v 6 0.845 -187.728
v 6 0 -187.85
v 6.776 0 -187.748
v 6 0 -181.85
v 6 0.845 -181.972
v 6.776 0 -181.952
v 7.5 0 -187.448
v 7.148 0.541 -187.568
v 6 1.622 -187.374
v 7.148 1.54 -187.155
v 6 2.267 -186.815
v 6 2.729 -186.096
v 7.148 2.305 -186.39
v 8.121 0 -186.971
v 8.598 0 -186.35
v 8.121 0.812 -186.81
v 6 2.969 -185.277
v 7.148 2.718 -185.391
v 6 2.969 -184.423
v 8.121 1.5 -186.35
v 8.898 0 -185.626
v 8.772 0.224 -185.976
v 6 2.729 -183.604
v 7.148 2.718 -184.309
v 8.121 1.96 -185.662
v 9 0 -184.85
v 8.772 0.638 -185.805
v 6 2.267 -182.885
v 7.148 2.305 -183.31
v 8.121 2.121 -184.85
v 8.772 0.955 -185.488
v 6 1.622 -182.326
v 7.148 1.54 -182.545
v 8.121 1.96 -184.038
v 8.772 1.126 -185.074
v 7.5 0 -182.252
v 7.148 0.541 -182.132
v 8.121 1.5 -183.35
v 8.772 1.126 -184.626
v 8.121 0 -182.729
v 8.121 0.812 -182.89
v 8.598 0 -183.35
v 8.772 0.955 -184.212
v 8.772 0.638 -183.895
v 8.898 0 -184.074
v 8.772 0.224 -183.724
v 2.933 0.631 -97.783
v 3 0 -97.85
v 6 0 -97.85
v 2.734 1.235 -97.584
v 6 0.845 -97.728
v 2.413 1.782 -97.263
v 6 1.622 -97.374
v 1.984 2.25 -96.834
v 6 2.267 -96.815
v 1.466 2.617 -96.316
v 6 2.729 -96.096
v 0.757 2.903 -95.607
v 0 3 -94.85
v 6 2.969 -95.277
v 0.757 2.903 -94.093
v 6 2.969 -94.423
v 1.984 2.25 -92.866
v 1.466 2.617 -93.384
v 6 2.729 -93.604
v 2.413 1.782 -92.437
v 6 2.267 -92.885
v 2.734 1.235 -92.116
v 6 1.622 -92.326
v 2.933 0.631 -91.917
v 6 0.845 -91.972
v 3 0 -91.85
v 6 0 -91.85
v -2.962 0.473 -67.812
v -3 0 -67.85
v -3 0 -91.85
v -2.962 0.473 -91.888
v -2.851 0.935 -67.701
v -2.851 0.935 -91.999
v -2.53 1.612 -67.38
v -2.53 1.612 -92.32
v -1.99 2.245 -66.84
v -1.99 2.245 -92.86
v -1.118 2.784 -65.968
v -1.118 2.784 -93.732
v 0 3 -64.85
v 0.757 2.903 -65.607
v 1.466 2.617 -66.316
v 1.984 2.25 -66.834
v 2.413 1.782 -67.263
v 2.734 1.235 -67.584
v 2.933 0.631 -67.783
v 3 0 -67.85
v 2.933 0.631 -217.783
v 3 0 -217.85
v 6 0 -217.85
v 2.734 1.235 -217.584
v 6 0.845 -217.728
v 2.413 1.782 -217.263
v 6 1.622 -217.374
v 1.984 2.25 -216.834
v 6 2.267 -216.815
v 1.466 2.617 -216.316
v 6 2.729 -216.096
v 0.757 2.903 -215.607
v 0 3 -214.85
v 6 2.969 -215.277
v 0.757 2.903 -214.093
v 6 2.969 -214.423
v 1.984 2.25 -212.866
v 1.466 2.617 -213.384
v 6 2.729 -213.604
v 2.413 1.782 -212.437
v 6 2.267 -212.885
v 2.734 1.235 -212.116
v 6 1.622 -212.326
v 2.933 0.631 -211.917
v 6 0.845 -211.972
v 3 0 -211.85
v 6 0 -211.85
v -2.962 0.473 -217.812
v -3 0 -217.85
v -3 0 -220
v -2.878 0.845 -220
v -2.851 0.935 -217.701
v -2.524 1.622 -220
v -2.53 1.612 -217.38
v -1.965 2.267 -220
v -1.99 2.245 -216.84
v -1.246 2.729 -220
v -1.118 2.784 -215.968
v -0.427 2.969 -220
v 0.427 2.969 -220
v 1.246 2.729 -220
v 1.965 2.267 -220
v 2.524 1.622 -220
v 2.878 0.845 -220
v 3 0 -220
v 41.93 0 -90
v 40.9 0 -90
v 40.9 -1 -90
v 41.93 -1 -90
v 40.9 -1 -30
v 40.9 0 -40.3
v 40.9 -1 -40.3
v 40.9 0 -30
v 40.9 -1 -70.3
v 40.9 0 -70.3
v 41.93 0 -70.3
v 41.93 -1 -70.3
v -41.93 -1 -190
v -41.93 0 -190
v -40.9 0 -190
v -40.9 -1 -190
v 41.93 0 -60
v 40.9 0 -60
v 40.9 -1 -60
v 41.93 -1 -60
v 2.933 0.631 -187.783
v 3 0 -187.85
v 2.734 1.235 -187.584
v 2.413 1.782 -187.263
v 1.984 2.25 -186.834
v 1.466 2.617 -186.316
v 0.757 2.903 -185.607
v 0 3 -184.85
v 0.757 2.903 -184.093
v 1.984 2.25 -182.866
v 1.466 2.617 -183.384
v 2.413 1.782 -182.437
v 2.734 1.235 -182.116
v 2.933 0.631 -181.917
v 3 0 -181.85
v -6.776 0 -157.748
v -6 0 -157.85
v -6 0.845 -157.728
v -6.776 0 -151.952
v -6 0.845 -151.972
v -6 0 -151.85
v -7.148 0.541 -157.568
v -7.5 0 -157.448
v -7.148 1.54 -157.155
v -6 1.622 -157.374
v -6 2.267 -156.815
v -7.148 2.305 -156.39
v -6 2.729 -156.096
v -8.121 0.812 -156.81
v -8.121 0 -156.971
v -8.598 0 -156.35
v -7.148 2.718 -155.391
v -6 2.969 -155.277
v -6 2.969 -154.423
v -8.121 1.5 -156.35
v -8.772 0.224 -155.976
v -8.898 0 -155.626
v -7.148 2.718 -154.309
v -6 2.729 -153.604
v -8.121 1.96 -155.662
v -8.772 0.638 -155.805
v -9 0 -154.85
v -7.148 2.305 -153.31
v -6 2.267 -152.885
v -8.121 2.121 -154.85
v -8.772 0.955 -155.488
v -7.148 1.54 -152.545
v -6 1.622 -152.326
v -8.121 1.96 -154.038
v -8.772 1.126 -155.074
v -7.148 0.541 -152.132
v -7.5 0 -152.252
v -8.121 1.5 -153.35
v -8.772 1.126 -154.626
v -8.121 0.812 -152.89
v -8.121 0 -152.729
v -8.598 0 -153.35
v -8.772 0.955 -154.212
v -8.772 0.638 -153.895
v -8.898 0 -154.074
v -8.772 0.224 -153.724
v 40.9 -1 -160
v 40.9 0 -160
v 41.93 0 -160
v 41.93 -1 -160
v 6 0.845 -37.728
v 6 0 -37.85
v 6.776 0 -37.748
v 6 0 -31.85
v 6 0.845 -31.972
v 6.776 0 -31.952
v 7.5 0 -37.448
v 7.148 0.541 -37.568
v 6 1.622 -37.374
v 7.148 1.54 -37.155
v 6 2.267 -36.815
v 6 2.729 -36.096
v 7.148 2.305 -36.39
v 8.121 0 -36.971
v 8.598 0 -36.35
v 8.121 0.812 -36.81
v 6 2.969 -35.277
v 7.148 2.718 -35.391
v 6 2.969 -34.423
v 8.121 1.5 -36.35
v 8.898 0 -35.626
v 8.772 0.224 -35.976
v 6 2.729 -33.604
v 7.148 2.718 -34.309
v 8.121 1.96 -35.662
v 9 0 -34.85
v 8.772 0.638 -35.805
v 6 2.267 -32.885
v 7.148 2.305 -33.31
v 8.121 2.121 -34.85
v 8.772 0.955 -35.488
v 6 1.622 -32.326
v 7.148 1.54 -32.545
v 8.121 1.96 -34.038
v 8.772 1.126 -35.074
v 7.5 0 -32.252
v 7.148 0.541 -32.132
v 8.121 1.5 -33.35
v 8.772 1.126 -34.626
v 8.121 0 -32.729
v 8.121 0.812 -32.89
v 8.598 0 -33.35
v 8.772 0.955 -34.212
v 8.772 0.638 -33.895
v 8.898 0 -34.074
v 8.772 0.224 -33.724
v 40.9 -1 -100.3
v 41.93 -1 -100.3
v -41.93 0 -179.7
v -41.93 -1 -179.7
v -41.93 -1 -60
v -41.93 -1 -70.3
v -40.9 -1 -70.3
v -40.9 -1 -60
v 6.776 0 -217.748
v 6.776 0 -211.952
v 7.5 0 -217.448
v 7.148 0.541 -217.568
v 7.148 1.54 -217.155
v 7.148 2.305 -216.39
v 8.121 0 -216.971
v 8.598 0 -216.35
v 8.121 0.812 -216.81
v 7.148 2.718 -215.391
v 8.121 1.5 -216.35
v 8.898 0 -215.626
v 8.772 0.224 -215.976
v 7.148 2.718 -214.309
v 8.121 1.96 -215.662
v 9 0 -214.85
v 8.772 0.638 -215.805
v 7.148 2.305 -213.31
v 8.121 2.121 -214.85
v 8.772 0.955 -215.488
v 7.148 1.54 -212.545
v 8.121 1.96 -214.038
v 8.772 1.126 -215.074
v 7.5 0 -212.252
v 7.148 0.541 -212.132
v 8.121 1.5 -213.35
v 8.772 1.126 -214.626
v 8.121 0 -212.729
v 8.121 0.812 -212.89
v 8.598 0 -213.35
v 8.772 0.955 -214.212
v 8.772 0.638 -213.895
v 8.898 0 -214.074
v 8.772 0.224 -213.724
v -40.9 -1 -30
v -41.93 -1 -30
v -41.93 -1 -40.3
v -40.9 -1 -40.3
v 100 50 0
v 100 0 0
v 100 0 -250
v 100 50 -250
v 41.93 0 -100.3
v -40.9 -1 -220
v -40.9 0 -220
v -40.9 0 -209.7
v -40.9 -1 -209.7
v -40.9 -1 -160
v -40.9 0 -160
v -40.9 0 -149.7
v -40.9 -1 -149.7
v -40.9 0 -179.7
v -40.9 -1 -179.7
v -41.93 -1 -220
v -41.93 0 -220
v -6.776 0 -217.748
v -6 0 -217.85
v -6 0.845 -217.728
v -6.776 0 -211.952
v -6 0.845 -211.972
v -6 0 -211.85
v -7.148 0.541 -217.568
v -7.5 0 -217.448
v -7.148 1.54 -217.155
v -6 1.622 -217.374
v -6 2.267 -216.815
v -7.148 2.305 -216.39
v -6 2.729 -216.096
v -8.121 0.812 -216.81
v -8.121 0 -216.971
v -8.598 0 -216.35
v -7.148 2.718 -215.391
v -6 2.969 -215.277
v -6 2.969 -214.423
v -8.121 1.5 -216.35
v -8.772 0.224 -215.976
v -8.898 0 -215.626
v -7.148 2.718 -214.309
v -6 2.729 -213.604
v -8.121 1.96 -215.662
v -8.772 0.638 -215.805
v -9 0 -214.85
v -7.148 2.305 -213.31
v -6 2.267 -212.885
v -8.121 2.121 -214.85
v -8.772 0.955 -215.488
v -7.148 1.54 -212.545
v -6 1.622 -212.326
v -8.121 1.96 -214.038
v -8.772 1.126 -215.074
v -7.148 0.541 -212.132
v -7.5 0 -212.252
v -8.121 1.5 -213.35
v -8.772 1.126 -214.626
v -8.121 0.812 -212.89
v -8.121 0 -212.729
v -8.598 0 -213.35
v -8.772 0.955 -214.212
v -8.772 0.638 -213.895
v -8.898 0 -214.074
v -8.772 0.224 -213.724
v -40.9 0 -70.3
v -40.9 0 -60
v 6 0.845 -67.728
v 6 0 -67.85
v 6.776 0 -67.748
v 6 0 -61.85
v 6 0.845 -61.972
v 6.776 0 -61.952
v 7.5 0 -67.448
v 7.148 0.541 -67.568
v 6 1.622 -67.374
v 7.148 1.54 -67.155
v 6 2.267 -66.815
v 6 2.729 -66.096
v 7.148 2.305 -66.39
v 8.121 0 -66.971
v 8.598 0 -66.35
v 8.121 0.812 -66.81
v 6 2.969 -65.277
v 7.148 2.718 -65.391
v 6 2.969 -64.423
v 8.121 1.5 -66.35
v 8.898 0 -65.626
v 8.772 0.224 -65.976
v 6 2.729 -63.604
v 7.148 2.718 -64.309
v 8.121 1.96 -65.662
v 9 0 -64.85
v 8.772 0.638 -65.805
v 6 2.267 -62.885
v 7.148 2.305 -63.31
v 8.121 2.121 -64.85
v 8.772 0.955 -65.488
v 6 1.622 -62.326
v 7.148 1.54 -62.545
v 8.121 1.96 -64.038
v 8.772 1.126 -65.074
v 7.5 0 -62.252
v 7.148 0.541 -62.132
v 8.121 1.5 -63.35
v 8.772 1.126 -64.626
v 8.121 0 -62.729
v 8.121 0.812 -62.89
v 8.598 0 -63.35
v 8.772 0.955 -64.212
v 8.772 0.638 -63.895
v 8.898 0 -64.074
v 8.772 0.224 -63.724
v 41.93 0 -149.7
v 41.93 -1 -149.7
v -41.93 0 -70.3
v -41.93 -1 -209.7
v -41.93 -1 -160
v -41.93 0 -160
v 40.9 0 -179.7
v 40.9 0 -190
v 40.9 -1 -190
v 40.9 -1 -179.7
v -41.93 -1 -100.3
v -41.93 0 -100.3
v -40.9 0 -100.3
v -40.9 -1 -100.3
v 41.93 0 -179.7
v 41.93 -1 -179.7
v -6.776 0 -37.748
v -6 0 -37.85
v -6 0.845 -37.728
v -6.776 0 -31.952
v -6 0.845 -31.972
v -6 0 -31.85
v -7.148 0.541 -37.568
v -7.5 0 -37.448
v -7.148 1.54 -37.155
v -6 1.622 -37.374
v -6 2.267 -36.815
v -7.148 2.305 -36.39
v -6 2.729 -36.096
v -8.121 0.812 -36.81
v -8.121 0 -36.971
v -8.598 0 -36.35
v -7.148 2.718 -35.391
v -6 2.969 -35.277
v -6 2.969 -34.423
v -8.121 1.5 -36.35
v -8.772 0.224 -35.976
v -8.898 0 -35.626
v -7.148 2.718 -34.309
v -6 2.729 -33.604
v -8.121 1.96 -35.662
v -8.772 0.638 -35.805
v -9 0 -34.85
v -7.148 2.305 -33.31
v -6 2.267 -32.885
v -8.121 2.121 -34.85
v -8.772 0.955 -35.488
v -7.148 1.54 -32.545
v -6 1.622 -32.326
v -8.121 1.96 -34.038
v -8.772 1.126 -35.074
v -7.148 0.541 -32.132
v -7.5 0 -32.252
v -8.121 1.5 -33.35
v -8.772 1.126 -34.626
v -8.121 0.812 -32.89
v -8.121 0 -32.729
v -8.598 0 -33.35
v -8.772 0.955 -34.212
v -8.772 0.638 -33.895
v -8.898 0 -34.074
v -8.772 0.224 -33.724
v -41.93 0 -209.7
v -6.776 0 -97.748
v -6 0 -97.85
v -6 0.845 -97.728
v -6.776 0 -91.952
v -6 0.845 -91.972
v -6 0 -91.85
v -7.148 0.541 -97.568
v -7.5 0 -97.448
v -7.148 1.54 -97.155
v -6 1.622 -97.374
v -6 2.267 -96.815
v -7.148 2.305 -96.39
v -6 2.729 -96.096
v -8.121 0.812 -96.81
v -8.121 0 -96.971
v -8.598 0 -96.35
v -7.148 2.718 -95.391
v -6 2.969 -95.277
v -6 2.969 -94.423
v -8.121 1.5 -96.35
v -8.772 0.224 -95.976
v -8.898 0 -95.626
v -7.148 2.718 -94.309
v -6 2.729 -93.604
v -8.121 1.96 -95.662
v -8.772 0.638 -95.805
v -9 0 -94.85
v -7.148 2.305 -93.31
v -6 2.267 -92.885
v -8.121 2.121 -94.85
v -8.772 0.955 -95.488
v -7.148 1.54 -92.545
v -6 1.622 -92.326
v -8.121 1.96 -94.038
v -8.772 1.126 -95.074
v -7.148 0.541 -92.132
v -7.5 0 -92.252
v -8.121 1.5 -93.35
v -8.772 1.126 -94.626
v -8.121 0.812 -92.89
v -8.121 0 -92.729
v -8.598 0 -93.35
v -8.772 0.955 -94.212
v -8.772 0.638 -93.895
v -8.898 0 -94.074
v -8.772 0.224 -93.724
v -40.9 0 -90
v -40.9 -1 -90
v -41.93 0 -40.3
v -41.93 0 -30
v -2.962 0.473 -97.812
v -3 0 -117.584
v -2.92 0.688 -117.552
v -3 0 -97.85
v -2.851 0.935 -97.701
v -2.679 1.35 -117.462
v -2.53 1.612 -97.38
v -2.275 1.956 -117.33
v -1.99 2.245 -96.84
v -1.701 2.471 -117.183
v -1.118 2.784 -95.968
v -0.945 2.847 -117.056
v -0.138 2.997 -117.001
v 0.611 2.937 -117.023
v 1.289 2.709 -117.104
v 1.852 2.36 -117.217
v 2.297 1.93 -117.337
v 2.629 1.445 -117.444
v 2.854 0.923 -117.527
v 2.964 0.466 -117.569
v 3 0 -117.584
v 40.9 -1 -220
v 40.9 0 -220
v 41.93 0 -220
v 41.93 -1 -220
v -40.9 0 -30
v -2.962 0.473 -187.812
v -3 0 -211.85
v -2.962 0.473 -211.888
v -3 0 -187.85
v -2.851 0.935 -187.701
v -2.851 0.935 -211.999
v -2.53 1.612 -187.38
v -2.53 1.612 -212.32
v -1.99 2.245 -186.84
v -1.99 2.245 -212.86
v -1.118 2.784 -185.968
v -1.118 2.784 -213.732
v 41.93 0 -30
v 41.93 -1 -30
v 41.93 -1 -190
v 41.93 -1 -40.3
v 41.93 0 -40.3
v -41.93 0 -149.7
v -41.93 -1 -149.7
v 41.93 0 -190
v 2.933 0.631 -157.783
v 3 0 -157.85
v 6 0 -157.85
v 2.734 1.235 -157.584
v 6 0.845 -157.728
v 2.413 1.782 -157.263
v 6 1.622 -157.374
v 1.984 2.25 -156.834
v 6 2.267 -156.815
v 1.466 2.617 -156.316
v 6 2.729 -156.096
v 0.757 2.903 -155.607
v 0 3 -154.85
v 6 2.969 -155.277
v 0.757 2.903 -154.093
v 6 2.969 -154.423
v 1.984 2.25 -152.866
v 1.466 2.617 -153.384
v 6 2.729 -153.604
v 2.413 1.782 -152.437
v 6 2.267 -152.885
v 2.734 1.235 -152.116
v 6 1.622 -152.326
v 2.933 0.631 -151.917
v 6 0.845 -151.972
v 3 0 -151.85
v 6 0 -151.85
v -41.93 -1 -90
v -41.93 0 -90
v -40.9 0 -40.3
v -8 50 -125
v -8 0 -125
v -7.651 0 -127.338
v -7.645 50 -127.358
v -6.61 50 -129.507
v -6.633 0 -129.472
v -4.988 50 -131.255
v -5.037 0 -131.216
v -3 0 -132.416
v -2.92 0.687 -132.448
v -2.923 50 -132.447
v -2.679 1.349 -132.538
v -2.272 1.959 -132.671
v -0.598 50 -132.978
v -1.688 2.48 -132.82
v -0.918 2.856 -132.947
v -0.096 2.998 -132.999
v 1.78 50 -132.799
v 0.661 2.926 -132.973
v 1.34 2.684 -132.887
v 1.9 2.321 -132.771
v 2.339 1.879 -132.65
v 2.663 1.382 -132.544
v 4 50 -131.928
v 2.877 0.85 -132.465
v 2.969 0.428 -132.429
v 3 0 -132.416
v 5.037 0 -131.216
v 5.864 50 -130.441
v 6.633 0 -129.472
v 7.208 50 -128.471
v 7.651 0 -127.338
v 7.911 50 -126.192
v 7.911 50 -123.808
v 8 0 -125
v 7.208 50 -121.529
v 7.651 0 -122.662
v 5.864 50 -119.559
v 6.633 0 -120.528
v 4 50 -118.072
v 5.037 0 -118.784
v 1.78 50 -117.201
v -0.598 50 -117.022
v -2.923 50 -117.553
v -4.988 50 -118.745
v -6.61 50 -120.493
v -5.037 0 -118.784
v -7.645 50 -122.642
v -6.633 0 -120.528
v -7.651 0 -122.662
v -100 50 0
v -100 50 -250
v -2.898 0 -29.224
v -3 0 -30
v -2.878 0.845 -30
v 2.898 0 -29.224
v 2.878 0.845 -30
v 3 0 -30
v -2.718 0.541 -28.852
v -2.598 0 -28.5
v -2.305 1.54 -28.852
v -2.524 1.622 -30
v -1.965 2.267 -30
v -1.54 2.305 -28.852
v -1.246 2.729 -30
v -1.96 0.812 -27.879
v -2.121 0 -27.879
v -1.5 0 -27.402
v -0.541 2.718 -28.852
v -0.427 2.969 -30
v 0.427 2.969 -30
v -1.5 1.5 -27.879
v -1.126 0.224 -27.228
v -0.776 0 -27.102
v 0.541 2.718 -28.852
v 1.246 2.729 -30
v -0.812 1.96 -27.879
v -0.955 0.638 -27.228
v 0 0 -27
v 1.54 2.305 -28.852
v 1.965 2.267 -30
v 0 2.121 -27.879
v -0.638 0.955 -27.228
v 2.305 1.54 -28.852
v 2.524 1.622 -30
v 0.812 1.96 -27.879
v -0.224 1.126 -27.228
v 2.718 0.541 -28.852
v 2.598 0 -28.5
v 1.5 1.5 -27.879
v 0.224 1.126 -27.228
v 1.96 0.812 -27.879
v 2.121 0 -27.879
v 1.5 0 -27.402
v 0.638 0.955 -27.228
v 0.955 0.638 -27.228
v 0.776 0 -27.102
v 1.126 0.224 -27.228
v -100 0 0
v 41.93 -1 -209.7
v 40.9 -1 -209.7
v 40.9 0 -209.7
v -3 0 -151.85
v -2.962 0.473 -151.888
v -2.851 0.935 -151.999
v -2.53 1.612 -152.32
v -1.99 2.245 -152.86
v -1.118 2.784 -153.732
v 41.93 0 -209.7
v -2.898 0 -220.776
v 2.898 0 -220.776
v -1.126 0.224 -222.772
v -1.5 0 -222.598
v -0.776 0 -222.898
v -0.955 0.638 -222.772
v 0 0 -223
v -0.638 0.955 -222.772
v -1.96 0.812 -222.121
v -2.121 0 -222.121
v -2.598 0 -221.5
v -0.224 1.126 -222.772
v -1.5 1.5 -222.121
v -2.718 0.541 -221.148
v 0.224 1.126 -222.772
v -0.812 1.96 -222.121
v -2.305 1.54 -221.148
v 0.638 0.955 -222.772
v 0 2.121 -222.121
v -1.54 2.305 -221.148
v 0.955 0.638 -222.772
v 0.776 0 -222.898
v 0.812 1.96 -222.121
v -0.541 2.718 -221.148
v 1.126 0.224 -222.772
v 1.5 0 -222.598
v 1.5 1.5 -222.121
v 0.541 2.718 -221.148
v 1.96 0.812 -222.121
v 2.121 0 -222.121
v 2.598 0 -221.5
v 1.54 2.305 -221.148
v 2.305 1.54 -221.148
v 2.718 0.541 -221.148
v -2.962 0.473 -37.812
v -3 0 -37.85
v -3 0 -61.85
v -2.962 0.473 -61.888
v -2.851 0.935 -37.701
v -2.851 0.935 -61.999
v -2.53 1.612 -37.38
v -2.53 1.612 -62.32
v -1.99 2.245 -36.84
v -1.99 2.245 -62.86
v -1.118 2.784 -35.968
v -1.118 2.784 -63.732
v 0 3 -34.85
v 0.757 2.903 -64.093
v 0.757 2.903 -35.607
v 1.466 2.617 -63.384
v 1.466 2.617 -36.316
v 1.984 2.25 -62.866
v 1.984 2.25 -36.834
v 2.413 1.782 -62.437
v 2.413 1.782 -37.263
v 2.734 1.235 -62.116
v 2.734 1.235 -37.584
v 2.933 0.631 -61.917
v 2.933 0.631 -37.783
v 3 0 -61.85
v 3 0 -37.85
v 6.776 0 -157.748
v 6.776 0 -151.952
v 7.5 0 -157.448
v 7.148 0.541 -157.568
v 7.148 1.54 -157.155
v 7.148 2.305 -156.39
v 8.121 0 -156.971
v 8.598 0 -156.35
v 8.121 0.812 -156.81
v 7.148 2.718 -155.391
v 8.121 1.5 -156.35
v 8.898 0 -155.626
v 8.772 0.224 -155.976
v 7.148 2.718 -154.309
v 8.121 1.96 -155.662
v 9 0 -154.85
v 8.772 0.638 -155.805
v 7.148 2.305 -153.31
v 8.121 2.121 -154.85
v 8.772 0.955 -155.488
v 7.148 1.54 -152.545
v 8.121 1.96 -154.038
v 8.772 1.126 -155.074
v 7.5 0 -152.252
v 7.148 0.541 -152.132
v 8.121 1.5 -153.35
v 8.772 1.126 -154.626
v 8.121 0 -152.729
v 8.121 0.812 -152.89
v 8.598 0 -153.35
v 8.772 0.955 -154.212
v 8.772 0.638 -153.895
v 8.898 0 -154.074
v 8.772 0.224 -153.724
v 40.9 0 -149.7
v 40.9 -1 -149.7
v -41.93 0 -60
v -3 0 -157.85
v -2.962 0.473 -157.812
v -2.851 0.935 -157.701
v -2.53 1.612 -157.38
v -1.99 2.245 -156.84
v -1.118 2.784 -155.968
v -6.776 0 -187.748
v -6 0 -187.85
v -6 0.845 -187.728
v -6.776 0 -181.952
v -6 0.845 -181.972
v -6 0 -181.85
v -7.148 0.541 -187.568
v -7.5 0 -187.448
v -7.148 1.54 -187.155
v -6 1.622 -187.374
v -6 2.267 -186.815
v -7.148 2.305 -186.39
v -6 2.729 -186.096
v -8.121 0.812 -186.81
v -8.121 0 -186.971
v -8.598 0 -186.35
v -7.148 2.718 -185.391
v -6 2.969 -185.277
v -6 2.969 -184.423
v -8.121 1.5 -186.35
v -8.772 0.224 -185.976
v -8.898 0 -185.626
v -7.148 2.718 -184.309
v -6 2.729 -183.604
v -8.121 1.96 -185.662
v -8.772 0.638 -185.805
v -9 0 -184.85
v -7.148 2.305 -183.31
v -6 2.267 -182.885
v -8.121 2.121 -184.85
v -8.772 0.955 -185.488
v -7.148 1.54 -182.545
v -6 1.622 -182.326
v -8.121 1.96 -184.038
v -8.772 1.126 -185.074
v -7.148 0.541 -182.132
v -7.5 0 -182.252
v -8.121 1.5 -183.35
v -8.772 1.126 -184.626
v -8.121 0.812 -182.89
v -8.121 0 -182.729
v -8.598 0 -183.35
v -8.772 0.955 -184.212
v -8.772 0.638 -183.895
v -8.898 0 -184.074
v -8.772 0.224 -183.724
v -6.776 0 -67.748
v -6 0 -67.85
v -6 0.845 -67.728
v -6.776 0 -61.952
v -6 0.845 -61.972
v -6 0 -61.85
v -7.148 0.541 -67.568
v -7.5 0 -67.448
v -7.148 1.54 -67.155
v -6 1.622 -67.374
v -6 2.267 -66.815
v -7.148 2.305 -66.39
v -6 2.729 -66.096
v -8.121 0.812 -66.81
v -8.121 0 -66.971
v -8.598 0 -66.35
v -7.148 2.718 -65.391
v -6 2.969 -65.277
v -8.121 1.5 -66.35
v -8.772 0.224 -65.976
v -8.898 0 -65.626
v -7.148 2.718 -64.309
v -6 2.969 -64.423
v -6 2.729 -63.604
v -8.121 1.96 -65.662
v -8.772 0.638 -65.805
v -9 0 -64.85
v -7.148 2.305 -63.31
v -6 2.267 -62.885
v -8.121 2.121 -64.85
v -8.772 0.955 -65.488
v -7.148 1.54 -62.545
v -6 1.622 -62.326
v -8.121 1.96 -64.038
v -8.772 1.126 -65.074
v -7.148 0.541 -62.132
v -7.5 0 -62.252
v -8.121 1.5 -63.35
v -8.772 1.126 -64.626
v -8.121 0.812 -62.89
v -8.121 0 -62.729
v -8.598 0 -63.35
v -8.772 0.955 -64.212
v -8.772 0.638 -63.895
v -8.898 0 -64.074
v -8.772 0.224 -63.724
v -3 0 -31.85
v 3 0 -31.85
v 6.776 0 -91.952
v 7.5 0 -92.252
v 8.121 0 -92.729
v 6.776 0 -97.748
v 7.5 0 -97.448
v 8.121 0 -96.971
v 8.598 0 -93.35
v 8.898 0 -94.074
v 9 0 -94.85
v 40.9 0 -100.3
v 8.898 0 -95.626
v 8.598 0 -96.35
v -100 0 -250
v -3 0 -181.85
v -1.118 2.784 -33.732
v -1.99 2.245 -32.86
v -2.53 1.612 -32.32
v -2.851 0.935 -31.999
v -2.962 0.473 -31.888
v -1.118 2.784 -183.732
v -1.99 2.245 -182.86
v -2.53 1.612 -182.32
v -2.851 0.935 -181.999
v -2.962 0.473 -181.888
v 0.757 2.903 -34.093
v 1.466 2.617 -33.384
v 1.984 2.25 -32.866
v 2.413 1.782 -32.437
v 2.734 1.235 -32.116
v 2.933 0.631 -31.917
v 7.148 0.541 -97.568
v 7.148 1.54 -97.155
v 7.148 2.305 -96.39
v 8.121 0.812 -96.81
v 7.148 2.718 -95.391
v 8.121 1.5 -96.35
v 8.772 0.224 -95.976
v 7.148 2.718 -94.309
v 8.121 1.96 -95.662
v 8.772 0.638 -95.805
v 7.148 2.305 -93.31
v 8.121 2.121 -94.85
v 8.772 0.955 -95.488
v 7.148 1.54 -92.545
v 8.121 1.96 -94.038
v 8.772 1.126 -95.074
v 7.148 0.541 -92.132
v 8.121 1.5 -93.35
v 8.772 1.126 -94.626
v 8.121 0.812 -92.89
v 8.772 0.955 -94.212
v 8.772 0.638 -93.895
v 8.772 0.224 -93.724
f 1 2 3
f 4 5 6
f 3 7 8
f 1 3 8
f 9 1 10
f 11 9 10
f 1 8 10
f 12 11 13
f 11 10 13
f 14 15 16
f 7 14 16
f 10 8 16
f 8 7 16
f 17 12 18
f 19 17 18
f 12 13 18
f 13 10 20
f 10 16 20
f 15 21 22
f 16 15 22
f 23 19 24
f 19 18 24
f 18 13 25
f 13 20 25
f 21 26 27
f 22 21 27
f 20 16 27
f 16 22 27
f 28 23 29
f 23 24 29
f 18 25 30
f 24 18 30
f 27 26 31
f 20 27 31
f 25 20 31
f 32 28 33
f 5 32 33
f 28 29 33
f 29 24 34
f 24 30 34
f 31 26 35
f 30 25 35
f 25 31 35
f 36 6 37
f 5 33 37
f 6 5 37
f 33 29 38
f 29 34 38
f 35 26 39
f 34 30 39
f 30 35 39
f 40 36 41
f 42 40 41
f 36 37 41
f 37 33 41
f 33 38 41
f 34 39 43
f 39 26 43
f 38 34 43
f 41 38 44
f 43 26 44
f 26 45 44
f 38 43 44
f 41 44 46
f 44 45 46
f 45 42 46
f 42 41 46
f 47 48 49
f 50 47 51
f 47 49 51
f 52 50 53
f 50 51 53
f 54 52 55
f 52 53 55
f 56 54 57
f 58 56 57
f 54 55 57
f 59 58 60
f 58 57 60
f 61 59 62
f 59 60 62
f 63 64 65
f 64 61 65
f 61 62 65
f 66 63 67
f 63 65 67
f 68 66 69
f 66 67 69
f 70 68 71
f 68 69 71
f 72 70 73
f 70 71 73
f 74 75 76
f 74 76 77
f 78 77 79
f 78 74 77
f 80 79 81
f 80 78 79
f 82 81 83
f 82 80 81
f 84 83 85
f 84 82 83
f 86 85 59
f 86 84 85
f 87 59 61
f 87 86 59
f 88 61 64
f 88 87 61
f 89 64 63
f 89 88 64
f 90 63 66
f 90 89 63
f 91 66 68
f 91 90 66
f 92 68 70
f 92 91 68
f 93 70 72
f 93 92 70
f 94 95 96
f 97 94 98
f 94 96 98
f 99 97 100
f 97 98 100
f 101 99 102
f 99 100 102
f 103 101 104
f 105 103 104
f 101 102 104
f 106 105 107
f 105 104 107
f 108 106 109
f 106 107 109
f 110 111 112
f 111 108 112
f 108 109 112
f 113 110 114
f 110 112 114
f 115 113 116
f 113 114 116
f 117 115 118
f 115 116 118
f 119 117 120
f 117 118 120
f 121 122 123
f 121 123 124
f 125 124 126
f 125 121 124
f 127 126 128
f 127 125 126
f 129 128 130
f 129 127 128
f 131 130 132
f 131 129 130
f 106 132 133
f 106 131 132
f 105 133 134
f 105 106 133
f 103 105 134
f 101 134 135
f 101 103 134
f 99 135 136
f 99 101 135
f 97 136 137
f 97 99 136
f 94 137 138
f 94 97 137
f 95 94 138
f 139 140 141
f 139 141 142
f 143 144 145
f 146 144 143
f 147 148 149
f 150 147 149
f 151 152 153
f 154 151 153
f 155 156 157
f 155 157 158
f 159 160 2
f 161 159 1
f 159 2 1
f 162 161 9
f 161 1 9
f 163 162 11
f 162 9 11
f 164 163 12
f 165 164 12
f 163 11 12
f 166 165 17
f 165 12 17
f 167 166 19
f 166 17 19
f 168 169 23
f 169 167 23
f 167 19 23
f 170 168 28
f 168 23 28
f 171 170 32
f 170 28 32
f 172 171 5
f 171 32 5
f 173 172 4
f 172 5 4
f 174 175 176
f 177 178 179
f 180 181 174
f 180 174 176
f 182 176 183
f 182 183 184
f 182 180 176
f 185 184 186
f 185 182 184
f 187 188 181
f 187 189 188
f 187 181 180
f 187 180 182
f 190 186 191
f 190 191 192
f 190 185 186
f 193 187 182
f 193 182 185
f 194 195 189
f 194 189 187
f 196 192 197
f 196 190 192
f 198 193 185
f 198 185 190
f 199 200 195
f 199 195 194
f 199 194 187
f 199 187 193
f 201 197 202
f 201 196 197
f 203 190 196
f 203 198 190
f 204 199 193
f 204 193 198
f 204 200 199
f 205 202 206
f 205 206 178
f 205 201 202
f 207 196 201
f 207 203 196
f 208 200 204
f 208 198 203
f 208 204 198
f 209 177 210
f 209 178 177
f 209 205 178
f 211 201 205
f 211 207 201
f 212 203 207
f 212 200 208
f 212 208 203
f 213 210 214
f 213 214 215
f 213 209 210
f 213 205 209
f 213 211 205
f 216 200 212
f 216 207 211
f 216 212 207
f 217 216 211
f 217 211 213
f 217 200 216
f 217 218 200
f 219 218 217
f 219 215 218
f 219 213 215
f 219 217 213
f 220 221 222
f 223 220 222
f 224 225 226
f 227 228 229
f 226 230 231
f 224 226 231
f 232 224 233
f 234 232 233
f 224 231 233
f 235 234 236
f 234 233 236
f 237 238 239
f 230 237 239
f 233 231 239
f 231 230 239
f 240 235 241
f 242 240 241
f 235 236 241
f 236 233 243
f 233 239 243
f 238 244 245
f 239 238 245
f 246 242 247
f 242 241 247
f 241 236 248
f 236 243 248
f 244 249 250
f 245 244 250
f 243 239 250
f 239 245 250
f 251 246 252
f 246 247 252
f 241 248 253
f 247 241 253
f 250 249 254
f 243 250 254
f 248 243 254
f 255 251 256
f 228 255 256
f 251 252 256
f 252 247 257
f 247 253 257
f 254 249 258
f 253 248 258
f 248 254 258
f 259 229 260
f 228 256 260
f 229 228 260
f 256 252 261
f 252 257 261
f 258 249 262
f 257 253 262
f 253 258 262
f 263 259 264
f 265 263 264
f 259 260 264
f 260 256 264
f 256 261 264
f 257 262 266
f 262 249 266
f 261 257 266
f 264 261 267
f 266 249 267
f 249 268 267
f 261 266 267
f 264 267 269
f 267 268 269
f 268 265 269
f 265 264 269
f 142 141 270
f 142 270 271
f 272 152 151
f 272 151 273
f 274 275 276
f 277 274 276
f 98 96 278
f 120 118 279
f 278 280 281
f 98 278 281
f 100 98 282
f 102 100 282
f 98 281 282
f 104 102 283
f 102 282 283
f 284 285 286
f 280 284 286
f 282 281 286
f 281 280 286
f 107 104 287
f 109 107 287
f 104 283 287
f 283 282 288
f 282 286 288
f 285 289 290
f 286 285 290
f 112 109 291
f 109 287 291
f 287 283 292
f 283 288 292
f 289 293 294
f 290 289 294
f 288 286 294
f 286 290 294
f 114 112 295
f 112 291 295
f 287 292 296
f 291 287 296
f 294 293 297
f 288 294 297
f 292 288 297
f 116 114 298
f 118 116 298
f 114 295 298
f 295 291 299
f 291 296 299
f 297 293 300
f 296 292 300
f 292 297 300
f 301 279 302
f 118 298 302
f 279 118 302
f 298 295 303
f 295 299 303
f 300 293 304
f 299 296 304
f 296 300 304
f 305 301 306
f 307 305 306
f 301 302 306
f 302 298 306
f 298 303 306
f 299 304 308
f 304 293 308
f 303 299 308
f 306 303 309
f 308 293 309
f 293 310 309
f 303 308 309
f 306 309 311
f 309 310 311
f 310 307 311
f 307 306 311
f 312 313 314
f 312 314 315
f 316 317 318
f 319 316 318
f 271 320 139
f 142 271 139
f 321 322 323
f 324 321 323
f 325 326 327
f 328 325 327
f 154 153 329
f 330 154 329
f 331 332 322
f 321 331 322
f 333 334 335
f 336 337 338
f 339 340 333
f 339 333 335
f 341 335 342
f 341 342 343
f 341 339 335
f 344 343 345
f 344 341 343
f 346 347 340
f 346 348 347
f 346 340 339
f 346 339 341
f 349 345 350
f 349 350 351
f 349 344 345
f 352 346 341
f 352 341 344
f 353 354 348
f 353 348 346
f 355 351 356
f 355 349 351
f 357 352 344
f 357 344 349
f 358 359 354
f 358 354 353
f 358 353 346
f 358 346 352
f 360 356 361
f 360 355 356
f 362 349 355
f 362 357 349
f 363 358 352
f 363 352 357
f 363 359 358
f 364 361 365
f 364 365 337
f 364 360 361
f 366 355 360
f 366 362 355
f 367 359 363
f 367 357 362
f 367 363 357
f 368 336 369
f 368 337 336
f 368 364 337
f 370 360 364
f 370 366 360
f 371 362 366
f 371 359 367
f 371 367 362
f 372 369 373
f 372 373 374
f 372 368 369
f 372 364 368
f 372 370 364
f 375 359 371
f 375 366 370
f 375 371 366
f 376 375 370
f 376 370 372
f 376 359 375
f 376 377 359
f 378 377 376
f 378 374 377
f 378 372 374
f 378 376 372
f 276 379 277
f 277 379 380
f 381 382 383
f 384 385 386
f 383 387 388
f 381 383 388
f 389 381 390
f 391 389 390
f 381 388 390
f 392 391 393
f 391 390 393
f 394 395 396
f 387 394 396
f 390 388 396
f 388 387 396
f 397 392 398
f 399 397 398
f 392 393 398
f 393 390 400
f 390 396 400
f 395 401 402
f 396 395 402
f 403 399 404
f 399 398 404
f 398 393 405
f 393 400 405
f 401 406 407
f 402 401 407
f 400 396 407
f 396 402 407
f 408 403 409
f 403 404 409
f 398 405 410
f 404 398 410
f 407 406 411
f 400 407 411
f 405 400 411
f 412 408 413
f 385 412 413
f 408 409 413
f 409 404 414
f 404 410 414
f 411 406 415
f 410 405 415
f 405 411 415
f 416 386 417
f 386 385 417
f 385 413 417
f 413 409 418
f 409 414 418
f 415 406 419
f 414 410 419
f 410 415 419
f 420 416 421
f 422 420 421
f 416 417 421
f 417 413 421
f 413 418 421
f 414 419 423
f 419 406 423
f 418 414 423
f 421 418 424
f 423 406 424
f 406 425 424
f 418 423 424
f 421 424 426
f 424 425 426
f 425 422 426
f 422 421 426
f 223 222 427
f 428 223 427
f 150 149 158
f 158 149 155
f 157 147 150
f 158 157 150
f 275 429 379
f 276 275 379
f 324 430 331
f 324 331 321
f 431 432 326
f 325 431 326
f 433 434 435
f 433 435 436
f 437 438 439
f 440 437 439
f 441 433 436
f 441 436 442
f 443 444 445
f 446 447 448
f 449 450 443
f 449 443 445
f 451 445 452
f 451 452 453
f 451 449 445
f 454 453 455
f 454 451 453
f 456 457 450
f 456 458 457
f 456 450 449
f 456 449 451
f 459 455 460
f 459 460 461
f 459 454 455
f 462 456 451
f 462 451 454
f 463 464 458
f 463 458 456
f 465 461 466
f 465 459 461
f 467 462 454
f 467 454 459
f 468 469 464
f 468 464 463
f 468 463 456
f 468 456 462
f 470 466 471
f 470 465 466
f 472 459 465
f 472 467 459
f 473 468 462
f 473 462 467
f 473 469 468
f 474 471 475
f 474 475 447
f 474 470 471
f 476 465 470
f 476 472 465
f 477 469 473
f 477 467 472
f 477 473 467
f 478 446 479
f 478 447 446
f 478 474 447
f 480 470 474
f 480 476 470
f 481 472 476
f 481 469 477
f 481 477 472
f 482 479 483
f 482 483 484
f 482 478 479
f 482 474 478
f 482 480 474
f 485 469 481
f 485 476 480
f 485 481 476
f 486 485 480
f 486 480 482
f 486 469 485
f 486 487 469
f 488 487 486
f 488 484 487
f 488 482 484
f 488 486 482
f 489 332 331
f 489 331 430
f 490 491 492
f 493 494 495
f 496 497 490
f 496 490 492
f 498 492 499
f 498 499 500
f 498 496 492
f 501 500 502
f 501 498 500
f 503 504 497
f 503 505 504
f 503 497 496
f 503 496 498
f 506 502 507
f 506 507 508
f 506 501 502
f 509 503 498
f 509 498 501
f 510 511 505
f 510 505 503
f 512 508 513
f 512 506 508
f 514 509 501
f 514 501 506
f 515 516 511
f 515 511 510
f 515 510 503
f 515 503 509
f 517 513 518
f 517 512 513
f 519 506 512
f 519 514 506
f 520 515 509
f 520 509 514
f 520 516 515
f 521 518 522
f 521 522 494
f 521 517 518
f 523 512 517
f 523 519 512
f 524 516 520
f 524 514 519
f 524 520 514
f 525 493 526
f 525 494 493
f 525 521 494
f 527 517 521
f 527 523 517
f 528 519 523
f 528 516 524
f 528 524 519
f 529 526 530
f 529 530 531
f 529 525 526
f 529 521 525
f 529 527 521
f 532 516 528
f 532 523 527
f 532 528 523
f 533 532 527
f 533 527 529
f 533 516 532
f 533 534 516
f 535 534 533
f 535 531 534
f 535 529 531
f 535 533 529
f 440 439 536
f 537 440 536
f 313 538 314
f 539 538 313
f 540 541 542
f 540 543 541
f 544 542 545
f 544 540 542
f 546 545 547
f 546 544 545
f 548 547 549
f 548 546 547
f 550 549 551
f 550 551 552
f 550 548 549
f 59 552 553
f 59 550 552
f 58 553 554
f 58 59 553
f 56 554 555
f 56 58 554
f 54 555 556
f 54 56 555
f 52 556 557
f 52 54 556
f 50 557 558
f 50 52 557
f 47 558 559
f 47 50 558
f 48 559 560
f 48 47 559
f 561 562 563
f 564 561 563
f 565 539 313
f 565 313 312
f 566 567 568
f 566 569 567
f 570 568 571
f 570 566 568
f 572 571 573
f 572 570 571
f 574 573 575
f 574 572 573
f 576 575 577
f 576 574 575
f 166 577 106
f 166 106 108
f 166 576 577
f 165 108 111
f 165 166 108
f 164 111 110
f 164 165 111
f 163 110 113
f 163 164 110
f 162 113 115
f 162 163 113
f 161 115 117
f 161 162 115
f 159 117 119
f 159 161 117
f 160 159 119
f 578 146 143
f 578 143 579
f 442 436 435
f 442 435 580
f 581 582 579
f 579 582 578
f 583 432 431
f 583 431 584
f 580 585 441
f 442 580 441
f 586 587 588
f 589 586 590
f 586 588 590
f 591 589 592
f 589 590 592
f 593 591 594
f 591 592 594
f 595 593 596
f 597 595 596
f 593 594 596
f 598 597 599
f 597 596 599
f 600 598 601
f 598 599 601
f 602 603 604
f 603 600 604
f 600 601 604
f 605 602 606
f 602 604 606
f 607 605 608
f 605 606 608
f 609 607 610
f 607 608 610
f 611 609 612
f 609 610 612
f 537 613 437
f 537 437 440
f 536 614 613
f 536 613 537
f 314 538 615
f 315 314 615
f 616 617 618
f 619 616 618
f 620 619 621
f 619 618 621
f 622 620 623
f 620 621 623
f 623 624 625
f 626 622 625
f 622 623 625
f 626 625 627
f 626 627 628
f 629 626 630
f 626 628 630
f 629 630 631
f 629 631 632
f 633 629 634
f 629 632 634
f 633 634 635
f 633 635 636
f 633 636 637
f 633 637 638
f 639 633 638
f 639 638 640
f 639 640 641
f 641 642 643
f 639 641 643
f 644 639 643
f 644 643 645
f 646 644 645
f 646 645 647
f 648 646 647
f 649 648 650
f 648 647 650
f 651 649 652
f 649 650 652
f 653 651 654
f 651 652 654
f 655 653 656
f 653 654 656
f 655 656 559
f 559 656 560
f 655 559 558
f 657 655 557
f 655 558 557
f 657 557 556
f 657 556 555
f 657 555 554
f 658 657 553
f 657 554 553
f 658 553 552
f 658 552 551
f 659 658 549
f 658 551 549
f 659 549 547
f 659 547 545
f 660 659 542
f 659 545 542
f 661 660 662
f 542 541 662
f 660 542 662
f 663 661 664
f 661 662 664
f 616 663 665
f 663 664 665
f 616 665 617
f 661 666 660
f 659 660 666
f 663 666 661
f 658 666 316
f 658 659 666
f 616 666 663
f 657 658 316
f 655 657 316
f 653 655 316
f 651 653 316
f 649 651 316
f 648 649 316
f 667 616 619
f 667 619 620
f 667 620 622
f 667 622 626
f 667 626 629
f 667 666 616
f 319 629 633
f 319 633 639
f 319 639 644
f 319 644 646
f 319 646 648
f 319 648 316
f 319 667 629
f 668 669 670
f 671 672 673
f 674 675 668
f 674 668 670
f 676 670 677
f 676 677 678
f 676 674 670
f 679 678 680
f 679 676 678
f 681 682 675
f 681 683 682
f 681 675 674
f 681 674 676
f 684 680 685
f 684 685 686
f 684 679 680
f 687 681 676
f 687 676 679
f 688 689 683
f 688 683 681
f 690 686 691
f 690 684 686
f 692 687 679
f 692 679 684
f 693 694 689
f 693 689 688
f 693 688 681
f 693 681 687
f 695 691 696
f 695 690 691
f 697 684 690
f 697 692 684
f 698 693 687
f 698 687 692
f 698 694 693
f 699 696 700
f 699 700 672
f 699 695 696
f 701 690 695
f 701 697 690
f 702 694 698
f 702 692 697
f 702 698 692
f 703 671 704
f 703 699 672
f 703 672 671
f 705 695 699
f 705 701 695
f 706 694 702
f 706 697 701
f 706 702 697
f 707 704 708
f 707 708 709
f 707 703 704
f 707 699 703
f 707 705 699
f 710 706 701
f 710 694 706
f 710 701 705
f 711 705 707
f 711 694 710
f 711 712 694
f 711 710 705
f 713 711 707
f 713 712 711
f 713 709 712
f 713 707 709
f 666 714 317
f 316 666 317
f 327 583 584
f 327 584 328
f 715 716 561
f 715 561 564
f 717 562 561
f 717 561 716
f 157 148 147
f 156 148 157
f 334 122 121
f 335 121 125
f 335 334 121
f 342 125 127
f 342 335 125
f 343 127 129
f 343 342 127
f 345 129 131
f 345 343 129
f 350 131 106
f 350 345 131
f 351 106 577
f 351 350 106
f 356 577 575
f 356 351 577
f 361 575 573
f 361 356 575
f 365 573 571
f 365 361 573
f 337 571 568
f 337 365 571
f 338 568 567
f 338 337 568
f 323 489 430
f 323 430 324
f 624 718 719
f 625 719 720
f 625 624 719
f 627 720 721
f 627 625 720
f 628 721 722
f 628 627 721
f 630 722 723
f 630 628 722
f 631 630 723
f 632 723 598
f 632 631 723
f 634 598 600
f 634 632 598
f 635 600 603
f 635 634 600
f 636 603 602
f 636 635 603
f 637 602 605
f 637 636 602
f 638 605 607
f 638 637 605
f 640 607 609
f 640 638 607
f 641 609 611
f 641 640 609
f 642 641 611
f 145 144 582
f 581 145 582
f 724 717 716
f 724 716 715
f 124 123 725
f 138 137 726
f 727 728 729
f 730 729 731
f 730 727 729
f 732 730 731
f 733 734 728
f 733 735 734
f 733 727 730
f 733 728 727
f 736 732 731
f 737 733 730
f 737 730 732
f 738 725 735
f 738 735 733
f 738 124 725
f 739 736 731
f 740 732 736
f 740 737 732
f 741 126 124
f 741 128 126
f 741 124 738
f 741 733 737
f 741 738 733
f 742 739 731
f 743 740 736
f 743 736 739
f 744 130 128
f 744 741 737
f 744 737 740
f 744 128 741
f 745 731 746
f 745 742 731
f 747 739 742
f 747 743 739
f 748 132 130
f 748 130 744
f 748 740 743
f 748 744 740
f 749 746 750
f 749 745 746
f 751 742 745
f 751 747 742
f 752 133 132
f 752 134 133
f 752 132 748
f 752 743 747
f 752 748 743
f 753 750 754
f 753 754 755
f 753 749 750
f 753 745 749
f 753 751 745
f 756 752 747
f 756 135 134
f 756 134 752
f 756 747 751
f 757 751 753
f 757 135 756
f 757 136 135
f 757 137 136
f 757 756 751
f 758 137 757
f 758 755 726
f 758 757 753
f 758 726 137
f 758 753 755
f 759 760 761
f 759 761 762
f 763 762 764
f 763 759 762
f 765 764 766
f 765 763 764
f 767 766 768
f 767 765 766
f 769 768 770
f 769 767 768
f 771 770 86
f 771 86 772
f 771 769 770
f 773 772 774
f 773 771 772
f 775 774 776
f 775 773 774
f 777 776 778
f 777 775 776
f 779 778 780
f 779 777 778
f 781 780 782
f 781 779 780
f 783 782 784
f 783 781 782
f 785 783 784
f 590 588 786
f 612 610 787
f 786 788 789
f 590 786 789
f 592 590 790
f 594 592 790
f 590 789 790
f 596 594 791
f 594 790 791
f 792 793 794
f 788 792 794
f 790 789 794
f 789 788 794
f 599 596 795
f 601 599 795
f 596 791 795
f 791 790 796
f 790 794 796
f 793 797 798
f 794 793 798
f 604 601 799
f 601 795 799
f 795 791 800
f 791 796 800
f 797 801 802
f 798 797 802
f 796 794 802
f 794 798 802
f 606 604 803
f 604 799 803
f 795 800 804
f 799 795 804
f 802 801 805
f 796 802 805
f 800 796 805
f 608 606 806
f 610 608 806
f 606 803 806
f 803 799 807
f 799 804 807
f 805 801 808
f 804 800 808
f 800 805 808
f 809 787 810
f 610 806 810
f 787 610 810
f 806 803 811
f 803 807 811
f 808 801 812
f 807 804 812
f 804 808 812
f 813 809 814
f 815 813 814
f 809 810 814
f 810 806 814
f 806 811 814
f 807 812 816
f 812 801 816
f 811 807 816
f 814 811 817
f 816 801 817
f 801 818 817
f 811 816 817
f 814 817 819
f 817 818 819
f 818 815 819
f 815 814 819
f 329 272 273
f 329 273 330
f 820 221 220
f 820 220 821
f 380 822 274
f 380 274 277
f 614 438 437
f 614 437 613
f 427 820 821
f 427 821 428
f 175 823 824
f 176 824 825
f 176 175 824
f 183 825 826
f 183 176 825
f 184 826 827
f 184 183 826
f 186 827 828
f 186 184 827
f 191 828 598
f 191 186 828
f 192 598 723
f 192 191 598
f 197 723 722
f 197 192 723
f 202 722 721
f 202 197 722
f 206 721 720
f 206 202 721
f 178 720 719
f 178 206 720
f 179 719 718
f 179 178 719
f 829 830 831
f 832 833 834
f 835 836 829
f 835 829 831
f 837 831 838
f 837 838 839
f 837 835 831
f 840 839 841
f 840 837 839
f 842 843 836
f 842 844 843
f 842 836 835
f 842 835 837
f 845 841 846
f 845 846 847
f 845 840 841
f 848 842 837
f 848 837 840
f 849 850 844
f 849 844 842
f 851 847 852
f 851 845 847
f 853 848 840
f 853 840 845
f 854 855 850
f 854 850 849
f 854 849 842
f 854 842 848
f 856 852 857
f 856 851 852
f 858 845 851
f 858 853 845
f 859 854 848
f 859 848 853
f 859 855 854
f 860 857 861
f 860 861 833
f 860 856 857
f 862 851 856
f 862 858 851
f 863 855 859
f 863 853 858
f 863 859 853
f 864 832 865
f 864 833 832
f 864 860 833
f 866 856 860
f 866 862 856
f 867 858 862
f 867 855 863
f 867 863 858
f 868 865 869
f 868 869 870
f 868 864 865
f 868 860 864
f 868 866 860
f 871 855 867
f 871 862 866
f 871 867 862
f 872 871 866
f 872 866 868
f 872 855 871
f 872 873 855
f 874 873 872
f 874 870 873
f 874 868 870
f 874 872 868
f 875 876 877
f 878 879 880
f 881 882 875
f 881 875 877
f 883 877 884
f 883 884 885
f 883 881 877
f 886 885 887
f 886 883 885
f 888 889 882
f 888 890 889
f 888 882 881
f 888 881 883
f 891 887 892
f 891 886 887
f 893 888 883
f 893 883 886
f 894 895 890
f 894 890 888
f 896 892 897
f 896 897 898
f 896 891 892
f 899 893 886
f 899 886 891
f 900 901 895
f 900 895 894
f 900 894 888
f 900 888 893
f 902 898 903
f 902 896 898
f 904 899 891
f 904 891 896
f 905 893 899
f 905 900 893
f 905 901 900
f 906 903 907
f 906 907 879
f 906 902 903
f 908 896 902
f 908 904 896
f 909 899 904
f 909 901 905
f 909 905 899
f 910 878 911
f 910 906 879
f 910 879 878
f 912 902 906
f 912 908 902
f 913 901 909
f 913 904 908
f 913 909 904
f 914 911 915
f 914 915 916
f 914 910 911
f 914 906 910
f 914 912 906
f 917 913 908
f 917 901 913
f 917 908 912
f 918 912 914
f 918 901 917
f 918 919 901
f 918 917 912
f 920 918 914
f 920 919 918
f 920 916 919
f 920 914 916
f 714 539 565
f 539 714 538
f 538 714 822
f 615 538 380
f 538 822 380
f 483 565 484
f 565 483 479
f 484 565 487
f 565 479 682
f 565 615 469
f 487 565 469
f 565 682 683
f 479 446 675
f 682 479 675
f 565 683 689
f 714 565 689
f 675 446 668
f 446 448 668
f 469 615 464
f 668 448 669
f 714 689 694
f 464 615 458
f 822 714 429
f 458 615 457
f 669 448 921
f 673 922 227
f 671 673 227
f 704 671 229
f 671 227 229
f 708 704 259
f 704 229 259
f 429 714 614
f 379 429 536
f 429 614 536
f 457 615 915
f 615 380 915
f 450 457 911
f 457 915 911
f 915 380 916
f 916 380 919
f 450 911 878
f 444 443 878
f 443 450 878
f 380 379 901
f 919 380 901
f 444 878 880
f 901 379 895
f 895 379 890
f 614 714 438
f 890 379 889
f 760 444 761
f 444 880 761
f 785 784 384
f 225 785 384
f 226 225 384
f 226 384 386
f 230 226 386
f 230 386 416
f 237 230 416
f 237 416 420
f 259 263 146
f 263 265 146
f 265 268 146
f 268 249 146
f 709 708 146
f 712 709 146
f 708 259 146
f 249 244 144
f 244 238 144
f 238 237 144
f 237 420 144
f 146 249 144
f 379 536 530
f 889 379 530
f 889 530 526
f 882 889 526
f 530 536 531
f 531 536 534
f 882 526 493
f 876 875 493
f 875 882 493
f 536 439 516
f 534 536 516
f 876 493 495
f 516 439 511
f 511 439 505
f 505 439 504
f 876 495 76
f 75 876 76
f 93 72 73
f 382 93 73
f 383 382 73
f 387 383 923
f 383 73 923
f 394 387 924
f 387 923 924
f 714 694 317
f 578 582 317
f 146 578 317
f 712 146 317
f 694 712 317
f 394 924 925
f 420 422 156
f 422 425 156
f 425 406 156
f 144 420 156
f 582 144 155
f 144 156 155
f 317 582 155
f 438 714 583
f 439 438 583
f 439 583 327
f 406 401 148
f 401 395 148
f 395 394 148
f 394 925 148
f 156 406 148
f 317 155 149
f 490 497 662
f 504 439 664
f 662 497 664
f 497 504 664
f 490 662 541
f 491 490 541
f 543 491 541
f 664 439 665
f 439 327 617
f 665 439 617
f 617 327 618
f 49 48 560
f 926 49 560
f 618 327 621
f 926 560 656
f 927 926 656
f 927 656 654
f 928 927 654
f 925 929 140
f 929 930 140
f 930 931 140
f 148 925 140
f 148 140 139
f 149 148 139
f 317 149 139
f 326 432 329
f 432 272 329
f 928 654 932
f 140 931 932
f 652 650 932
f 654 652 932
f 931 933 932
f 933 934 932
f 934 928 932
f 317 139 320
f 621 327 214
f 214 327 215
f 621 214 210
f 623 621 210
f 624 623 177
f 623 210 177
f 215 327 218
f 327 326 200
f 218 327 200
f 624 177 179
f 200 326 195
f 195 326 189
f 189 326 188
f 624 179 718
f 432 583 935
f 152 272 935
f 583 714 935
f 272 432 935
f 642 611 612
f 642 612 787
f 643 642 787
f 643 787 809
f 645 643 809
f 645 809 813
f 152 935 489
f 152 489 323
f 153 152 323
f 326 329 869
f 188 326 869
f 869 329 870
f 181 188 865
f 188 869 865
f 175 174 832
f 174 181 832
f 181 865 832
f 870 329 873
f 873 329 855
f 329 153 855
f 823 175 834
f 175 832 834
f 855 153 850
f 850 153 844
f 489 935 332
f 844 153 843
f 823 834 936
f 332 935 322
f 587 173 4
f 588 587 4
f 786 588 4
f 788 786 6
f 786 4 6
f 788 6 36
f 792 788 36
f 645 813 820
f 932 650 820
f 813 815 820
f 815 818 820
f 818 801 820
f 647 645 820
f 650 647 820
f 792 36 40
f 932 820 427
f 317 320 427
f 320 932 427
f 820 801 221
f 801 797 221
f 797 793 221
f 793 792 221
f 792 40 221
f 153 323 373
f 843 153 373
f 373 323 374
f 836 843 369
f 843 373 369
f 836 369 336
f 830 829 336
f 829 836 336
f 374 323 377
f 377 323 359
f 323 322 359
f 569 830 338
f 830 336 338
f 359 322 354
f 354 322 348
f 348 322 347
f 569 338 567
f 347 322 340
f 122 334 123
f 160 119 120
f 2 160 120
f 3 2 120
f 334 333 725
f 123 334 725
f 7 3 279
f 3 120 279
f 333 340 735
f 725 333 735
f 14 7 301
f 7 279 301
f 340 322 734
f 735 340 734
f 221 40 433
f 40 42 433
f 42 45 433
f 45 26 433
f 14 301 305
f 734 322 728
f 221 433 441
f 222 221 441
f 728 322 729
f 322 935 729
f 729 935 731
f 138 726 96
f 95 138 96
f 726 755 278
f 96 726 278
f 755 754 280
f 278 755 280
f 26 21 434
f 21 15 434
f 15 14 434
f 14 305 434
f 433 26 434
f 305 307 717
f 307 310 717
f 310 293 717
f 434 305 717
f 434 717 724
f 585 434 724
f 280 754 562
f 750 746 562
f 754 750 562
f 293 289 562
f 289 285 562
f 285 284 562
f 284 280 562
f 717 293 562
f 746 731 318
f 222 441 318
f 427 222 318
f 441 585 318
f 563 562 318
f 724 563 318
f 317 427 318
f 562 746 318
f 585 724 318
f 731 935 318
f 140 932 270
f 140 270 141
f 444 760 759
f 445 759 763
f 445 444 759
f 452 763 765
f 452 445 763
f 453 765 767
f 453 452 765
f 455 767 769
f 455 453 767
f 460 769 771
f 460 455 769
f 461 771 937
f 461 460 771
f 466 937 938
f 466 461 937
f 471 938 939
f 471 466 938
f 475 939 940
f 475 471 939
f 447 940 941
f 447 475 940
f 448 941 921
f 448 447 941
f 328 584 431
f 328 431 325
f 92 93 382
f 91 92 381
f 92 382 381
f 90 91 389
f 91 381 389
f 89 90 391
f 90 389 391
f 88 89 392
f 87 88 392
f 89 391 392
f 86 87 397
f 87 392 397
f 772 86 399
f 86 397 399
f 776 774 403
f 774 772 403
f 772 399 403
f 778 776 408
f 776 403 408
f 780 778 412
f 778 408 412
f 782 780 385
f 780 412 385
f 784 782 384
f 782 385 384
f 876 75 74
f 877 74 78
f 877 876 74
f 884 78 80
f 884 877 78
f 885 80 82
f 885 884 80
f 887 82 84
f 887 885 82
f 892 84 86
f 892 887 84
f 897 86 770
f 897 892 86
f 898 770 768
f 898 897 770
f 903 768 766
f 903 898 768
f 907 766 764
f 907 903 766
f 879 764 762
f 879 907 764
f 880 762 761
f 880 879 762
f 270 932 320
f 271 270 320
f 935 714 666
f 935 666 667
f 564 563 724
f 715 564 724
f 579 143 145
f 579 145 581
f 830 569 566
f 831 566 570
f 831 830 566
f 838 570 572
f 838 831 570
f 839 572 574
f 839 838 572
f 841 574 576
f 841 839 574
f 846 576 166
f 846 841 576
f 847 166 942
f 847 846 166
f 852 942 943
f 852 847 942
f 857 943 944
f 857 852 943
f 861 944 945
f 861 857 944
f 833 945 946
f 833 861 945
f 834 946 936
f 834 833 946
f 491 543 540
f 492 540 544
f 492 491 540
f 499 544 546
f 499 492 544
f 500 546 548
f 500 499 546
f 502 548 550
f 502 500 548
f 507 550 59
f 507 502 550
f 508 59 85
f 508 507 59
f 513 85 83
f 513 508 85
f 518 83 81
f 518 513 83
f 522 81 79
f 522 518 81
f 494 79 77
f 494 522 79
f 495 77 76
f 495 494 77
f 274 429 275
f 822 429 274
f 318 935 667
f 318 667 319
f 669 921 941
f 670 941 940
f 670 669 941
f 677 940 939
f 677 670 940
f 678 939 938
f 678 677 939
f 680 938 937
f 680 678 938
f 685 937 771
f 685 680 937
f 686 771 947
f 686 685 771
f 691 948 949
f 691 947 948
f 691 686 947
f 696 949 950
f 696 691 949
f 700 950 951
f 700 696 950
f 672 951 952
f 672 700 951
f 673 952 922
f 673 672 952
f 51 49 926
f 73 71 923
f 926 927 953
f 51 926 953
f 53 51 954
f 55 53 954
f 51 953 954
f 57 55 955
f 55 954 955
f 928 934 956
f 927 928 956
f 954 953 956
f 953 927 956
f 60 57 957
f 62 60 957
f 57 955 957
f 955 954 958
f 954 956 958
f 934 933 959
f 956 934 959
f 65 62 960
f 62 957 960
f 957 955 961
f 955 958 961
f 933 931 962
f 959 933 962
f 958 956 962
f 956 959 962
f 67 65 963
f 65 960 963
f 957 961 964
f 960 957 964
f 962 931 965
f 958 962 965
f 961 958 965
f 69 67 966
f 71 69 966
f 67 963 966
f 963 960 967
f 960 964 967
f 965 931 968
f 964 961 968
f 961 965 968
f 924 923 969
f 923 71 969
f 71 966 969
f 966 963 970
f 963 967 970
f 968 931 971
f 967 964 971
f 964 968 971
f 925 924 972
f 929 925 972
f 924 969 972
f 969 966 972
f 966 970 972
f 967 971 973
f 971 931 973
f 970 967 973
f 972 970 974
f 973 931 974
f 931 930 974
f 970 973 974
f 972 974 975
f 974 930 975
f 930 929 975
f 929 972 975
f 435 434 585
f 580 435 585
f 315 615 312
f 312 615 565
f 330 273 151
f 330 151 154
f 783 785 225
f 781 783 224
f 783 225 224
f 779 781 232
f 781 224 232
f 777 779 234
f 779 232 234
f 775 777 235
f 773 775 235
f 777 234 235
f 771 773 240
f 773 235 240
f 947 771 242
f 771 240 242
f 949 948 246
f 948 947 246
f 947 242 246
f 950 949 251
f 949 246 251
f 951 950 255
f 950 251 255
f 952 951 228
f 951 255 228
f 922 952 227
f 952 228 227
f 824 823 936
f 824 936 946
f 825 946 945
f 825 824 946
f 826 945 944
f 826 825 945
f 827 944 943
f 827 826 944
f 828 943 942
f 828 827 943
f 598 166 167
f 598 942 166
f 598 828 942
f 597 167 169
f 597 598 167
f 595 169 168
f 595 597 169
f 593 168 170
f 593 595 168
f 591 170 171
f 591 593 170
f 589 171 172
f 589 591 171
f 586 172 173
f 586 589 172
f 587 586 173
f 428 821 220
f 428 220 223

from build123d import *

# Parameters (mm, degrees)
ESBO_O1_W                    = 200
ESBO_O1_H                    = 250
RESSALTO_EXTRUS_O1_DEPTH     = 50
FURO_DE_DI_METRO_16_0_16_1_D = 16
PADR_O_LINEAR1_COUNT         = 3
PADR_O_LINEAR1_PITCH         = 30
PADR_O_LINEAR1_COUNT_DIR2    = 2
PADR_O_LINEAR1_PITCH_DIR2    = 120
ESBO_O7_W                    = 1.03
ESBO_O7_H                    = 10.3
RESSALTO_EXTRUS_O2_DEPTH     = 1


with BuildPart() as part:
    # Esboço1 → Ressalto-extrusão1 (new body)
    with BuildSketch(Plane(origin=(0, 0, 0), x_dir=(1, 0, 0), z_dir=(0, 1, 0))):
        with Locations((0, 125)):
            Rectangle(ESBO_O1_W, ESBO_O1_H)
    extrude(amount=RESSALTO_EXTRUS_O1_DEPTH)

    # Furo de diâmetro Ø16.0 (16)1 (through all)
    with Locations(Plane(origin=(0, 50, 0), x_dir=(1, 0, 0), z_dir=(0, 1, 0))):
        with Locations((0, 125)):
            Hole(FURO_DE_DI_METRO_16_0_16_1_D / 2)

    # Esboço5 → Corte-Revolução1 (revolve, cut)
    with BuildSketch(Plane.XZ):
        with BuildLine():
            Line((0, -27), (0, -223))
            ThreePointArc((0, -223), (2.121320344, -222.121320344), (3, -220))
            Line((3, -220), (3, -30))
            ThreePointArc((3, -30), (2.121320344, -27.878679656), (0, -27))
        make_face()
    revolve(axis=Axis((0, 0, -27), (0, 0, -1)), mode=Mode.SUBTRACT)

    # Esboço6 → Corte-Revolução2 (revolve, cut)
    with BuildSketch(Plane.XZ):
        with BuildLine():
            Line((-9, -34.85), (0, -34.85))
            Line((0, -34.85), (0, -31.85))
            Line((0, -31.85), (-6, -31.85))
            ThreePointArc((-6, -31.85), (-8.121320344, -32.728679656), (-9, -34.85))
        make_face()
    corte_revolu_o2 = revolve(axis=Axis((-9, 0, -34.85), (1, 0, 0)), mode=Mode.SUBTRACT)

    # Padrão linear1: Corte-Revolu_o2 3 × 2
    with Locations(*[Vector(0, 0, -1) * (i * PADR_O_LINEAR1_PITCH) + Vector(0, 0, -1) * (j * PADR_O_LINEAR1_PITCH_DIR2) for i in range(PADR_O_LINEAR1_COUNT) for j in range(PADR_O_LINEAR1_COUNT_DIR2) if (i, j) != (0, 0)]):
        add(corte_revolu_o2, mode=Mode.SUBTRACT)

    # Espelhar1: Corte-Revolução2 across plane
    add(corte_revolu_o2.mirror(Plane(origin=(0, 0, 0), x_dir=(0, 0, 1), z_dir=(1, 0, 0))), mode=Mode.SUBTRACT)

    # Espelhar1 copy 1 sketch → Espelhar1 copy 1 (revolve, cut)
    with BuildSketch(Plane(origin=(0, 0, -120), x_dir=(-1, 0, 0), z_dir=(0, -1, 0))):
        with BuildLine():
            Line((-9, 34.85), (0, 34.85))
            Line((0, 34.85), (0, 31.85))
            Line((0, 31.85), (-6, 31.85))
            ThreePointArc((-6, 31.85), (-8.121320344, 32.728679656), (-9, 34.85))
        make_face()
    revolve(axis=Axis((9, 0, -154.85), (1, 0, 0)), mode=Mode.SUBTRACT)

    # Espelhar1 copy 2 sketch → Espelhar1 copy 2 (revolve, cut)
    with BuildSketch(Plane(origin=(0, 0, -30), x_dir=(-1, 0, 0), z_dir=(0, -1, 0))):
        with BuildLine():
            Line((-9, 34.85), (0, 34.85))
            Line((0, 34.85), (0, 31.85))
            Line((0, 31.85), (-6, 31.85))
            ThreePointArc((-6, 31.85), (-8.121320344, 32.728679656), (-9, 34.85))
        make_face()
    revolve(axis=Axis((9, 0, -64.85), (1, 0, 0)), mode=Mode.SUBTRACT)

    # Espelhar1 copy 3 sketch → Espelhar1 copy 3 (revolve, cut)
    with BuildSketch(Plane(origin=(0, 0, -150), x_dir=(-1, 0, 0), z_dir=(0, -1, 0))):
        with BuildLine():
            Line((-9, 34.85), (0, 34.85))
            Line((0, 34.85), (0, 31.85))
            Line((0, 31.85), (-6, 31.85))
            ThreePointArc((-6, 31.85), (-8.121320344, 32.728679656), (-9, 34.85))
        make_face()
    revolve(axis=Axis((9, 0, -184.85), (1, 0, 0)), mode=Mode.SUBTRACT)

    # Espelhar1 copy 4 sketch → Espelhar1 copy 4 (revolve, cut)
    with BuildSketch(Plane(origin=(0, 0, -60), x_dir=(-1, 0, 0), z_dir=(0, -1, 0))):
        with BuildLine():
            Line((-9, 34.85), (0, 34.85))
            Line((0, 34.85), (0, 31.85))
            Line((0, 31.85), (-6, 31.85))
            ThreePointArc((-6, 31.85), (-8.121320344, 32.728679656), (-9, 34.85))
        make_face()
    revolve(axis=Axis((9, 0, -94.85), (1, 0, 0)), mode=Mode.SUBTRACT)

    # Espelhar1 copy 5 sketch → Espelhar1 copy 5 (revolve, cut)
    with BuildSketch(Plane(origin=(0, 0, -180), x_dir=(-1, 0, 0), z_dir=(0, -1, 0))):
        with BuildLine():
            Line((-9, 34.85), (0, 34.85))
            Line((0, 34.85), (0, 31.85))
            Line((0, 31.85), (-6, 31.85))
            ThreePointArc((-6, 31.85), (-8.121320344, 32.728679656), (-9, 34.85))
        make_face()
    revolve(axis=Axis((9, 0, -214.85), (1, 0, 0)), mode=Mode.SUBTRACT)

    # Esboço7 → Ressalto-extrusão2 (add)
    with BuildSketch(Plane.XZ):
        with Locations((-41.415, -35.15)):
            Rectangle(ESBO_O7_W, ESBO_O7_H)
        with Locations((-41.415, -65.15)):
            Rectangle(ESBO_O7_W, ESBO_O7_H)
        with Locations((-41.415, -95.15)):
            Rectangle(ESBO_O7_W, ESBO_O7_H)
        with Locations((-41.415, -154.85)):
            Rectangle(ESBO_O7_W, ESBO_O7_H)
        with Locations((-41.415, -184.85)):
            Rectangle(ESBO_O7_W, ESBO_O7_H)
        with Locations((-41.415, -214.85)):
            Rectangle(ESBO_O7_W, ESBO_O7_H)
        with Locations((41.415, -214.85)):
            Rectangle(ESBO_O7_W, ESBO_O7_H)
        with Locations((41.415, -184.85)):
            Rectangle(ESBO_O7_W, ESBO_O7_H)
        with Locations((41.415, -154.85)):
            Rectangle(ESBO_O7_W, ESBO_O7_H)
        with Locations((41.415, -95.15)):
            Rectangle(ESBO_O7_W, ESBO_O7_H)
        with Locations((41.415, -65.15)):
            Rectangle(ESBO_O7_W, ESBO_O7_H)
        with Locations((41.415, -35.15)):
            Rectangle(ESBO_O7_W, ESBO_O7_H)
    extrude(amount=RESSALTO_EXTRUS_O2_DEPTH)


solid = part.part
